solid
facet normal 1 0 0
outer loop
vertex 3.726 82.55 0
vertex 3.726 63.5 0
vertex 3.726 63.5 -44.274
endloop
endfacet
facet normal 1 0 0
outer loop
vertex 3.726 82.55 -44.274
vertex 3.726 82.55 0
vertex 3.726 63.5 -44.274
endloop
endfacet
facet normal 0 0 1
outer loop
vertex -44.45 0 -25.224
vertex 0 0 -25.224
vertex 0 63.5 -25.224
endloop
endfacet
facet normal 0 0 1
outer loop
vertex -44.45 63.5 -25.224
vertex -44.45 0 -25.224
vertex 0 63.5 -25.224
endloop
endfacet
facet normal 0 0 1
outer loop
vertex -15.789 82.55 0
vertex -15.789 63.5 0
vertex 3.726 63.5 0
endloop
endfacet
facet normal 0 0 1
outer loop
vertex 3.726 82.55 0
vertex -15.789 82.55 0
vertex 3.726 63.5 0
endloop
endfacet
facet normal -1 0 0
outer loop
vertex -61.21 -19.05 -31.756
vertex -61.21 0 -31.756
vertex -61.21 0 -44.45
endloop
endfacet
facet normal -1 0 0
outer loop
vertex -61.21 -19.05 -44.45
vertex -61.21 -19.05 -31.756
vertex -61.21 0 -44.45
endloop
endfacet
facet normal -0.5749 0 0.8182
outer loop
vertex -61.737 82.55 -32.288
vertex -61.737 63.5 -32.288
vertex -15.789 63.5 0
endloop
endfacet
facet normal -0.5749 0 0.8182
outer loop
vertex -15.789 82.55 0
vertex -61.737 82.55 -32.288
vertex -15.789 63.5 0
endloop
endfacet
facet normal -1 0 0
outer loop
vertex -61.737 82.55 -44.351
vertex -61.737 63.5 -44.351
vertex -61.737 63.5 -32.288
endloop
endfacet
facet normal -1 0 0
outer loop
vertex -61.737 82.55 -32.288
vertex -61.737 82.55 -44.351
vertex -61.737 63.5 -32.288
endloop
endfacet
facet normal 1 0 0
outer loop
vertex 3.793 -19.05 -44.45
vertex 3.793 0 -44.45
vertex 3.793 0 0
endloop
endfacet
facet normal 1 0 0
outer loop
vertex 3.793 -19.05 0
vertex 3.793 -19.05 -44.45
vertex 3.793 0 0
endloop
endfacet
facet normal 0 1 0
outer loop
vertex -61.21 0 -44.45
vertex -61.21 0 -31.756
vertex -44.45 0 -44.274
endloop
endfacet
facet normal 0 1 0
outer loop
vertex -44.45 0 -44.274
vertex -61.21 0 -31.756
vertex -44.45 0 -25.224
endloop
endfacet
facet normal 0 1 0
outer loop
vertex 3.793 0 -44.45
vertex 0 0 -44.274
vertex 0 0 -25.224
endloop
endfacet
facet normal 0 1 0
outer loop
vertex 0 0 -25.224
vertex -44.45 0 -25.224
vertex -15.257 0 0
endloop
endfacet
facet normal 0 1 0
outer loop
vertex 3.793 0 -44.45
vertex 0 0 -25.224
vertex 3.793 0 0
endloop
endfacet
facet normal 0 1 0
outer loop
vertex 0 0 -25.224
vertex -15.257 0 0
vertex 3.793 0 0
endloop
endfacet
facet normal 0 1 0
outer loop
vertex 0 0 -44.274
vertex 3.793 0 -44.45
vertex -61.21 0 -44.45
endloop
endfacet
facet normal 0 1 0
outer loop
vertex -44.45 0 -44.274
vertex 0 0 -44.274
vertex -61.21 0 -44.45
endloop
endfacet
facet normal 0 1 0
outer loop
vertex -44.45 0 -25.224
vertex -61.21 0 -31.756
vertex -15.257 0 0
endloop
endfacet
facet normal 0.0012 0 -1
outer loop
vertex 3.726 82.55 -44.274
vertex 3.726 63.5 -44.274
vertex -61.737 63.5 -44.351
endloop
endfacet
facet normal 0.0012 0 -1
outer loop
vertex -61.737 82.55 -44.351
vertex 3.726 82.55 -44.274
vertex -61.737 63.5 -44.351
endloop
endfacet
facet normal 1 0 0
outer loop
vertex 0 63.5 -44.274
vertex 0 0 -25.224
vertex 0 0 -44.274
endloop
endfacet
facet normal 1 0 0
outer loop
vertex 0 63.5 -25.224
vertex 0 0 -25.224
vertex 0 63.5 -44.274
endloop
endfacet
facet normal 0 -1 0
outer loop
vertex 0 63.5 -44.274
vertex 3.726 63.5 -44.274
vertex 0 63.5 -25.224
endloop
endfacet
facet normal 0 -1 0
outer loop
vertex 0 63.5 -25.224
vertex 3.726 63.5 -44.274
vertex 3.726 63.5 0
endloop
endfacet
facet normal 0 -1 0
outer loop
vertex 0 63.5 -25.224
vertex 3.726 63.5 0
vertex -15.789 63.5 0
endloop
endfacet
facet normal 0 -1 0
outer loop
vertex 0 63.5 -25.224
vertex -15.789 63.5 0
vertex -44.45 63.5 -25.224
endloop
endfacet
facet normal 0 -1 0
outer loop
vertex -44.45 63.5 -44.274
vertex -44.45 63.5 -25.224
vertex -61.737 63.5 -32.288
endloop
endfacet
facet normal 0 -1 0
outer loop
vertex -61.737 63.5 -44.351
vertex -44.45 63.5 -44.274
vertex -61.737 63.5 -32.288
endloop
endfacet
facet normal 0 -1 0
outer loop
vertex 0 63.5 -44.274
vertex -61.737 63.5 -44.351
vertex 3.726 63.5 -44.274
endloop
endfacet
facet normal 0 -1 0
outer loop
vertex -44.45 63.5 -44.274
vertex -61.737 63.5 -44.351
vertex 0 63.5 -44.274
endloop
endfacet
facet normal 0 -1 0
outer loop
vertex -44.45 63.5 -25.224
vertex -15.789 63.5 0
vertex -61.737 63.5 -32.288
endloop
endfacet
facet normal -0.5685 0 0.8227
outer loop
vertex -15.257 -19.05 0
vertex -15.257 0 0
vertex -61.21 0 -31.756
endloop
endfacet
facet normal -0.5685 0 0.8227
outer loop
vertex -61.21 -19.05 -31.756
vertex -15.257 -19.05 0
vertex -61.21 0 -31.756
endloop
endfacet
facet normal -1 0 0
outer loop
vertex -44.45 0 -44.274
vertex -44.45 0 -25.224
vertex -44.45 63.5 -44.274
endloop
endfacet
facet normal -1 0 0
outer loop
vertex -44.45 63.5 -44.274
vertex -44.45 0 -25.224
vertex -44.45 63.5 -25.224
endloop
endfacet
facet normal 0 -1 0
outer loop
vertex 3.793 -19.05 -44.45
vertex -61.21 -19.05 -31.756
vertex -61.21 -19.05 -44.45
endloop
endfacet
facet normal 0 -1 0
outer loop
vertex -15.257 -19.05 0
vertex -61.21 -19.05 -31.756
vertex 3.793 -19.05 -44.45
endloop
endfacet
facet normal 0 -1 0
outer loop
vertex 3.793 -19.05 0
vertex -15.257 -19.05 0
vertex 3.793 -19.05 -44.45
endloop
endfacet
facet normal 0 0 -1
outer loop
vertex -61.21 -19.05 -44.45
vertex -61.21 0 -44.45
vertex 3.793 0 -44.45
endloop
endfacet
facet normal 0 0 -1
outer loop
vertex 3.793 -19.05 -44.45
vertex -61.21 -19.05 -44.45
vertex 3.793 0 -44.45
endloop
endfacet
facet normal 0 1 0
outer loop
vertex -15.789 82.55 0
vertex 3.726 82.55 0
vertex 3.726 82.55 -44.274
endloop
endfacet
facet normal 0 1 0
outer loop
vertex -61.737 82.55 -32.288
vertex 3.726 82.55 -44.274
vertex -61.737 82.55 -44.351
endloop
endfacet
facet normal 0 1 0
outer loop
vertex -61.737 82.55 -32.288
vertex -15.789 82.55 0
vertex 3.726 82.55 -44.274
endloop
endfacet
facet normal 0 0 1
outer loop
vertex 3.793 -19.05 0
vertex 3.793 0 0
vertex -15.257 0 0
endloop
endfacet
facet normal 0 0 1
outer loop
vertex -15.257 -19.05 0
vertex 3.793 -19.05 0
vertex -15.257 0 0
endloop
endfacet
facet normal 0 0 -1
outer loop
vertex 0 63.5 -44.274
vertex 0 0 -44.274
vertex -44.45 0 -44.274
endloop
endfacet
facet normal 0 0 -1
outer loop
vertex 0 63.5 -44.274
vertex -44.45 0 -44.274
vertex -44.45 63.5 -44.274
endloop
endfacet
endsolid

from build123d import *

# Parameters (mm, degrees)
F1_DEPTH = 19.05
F2_W     = 63.5
F2_H     = 19.050002
F3_DEPTH = 44.45
F5_DEPTH = 19.05


with BuildPart() as f1:
    # F0 (on Front) → F1 (new body)
    with BuildSketch(Plane.XZ):
        Polygon((-61.209836, -31.755634), (-61.209836, -44.45), (3.793104, -44.45), (3.793104, 0), (-15.256896, 0), align=None)
    extrude(amount=F1_DEPTH)

    # F2 (on Right) → F3 (join)
    with BuildSketch(Plane.YZ):
        with Locations((31.75, -34.74861)):
            Rectangle(F2_W, F2_H)
    extrude(amount=-F3_DEPTH)

    # F4 (on face) → F5 (join)
    with BuildSketch(Plane(origin=(0, 63.5, 0), x_dir=(-1, 0, 0), z_dir=(0, 1, 0))):
        Polygon((-3.725521, 0), (-3.725521, -44.273611), (61.737206, -44.351444), (61.737206, -32.287851), (15.789114, 0), align=None)
    extrude(amount=F5_DEPTH)


solid = f1.part
